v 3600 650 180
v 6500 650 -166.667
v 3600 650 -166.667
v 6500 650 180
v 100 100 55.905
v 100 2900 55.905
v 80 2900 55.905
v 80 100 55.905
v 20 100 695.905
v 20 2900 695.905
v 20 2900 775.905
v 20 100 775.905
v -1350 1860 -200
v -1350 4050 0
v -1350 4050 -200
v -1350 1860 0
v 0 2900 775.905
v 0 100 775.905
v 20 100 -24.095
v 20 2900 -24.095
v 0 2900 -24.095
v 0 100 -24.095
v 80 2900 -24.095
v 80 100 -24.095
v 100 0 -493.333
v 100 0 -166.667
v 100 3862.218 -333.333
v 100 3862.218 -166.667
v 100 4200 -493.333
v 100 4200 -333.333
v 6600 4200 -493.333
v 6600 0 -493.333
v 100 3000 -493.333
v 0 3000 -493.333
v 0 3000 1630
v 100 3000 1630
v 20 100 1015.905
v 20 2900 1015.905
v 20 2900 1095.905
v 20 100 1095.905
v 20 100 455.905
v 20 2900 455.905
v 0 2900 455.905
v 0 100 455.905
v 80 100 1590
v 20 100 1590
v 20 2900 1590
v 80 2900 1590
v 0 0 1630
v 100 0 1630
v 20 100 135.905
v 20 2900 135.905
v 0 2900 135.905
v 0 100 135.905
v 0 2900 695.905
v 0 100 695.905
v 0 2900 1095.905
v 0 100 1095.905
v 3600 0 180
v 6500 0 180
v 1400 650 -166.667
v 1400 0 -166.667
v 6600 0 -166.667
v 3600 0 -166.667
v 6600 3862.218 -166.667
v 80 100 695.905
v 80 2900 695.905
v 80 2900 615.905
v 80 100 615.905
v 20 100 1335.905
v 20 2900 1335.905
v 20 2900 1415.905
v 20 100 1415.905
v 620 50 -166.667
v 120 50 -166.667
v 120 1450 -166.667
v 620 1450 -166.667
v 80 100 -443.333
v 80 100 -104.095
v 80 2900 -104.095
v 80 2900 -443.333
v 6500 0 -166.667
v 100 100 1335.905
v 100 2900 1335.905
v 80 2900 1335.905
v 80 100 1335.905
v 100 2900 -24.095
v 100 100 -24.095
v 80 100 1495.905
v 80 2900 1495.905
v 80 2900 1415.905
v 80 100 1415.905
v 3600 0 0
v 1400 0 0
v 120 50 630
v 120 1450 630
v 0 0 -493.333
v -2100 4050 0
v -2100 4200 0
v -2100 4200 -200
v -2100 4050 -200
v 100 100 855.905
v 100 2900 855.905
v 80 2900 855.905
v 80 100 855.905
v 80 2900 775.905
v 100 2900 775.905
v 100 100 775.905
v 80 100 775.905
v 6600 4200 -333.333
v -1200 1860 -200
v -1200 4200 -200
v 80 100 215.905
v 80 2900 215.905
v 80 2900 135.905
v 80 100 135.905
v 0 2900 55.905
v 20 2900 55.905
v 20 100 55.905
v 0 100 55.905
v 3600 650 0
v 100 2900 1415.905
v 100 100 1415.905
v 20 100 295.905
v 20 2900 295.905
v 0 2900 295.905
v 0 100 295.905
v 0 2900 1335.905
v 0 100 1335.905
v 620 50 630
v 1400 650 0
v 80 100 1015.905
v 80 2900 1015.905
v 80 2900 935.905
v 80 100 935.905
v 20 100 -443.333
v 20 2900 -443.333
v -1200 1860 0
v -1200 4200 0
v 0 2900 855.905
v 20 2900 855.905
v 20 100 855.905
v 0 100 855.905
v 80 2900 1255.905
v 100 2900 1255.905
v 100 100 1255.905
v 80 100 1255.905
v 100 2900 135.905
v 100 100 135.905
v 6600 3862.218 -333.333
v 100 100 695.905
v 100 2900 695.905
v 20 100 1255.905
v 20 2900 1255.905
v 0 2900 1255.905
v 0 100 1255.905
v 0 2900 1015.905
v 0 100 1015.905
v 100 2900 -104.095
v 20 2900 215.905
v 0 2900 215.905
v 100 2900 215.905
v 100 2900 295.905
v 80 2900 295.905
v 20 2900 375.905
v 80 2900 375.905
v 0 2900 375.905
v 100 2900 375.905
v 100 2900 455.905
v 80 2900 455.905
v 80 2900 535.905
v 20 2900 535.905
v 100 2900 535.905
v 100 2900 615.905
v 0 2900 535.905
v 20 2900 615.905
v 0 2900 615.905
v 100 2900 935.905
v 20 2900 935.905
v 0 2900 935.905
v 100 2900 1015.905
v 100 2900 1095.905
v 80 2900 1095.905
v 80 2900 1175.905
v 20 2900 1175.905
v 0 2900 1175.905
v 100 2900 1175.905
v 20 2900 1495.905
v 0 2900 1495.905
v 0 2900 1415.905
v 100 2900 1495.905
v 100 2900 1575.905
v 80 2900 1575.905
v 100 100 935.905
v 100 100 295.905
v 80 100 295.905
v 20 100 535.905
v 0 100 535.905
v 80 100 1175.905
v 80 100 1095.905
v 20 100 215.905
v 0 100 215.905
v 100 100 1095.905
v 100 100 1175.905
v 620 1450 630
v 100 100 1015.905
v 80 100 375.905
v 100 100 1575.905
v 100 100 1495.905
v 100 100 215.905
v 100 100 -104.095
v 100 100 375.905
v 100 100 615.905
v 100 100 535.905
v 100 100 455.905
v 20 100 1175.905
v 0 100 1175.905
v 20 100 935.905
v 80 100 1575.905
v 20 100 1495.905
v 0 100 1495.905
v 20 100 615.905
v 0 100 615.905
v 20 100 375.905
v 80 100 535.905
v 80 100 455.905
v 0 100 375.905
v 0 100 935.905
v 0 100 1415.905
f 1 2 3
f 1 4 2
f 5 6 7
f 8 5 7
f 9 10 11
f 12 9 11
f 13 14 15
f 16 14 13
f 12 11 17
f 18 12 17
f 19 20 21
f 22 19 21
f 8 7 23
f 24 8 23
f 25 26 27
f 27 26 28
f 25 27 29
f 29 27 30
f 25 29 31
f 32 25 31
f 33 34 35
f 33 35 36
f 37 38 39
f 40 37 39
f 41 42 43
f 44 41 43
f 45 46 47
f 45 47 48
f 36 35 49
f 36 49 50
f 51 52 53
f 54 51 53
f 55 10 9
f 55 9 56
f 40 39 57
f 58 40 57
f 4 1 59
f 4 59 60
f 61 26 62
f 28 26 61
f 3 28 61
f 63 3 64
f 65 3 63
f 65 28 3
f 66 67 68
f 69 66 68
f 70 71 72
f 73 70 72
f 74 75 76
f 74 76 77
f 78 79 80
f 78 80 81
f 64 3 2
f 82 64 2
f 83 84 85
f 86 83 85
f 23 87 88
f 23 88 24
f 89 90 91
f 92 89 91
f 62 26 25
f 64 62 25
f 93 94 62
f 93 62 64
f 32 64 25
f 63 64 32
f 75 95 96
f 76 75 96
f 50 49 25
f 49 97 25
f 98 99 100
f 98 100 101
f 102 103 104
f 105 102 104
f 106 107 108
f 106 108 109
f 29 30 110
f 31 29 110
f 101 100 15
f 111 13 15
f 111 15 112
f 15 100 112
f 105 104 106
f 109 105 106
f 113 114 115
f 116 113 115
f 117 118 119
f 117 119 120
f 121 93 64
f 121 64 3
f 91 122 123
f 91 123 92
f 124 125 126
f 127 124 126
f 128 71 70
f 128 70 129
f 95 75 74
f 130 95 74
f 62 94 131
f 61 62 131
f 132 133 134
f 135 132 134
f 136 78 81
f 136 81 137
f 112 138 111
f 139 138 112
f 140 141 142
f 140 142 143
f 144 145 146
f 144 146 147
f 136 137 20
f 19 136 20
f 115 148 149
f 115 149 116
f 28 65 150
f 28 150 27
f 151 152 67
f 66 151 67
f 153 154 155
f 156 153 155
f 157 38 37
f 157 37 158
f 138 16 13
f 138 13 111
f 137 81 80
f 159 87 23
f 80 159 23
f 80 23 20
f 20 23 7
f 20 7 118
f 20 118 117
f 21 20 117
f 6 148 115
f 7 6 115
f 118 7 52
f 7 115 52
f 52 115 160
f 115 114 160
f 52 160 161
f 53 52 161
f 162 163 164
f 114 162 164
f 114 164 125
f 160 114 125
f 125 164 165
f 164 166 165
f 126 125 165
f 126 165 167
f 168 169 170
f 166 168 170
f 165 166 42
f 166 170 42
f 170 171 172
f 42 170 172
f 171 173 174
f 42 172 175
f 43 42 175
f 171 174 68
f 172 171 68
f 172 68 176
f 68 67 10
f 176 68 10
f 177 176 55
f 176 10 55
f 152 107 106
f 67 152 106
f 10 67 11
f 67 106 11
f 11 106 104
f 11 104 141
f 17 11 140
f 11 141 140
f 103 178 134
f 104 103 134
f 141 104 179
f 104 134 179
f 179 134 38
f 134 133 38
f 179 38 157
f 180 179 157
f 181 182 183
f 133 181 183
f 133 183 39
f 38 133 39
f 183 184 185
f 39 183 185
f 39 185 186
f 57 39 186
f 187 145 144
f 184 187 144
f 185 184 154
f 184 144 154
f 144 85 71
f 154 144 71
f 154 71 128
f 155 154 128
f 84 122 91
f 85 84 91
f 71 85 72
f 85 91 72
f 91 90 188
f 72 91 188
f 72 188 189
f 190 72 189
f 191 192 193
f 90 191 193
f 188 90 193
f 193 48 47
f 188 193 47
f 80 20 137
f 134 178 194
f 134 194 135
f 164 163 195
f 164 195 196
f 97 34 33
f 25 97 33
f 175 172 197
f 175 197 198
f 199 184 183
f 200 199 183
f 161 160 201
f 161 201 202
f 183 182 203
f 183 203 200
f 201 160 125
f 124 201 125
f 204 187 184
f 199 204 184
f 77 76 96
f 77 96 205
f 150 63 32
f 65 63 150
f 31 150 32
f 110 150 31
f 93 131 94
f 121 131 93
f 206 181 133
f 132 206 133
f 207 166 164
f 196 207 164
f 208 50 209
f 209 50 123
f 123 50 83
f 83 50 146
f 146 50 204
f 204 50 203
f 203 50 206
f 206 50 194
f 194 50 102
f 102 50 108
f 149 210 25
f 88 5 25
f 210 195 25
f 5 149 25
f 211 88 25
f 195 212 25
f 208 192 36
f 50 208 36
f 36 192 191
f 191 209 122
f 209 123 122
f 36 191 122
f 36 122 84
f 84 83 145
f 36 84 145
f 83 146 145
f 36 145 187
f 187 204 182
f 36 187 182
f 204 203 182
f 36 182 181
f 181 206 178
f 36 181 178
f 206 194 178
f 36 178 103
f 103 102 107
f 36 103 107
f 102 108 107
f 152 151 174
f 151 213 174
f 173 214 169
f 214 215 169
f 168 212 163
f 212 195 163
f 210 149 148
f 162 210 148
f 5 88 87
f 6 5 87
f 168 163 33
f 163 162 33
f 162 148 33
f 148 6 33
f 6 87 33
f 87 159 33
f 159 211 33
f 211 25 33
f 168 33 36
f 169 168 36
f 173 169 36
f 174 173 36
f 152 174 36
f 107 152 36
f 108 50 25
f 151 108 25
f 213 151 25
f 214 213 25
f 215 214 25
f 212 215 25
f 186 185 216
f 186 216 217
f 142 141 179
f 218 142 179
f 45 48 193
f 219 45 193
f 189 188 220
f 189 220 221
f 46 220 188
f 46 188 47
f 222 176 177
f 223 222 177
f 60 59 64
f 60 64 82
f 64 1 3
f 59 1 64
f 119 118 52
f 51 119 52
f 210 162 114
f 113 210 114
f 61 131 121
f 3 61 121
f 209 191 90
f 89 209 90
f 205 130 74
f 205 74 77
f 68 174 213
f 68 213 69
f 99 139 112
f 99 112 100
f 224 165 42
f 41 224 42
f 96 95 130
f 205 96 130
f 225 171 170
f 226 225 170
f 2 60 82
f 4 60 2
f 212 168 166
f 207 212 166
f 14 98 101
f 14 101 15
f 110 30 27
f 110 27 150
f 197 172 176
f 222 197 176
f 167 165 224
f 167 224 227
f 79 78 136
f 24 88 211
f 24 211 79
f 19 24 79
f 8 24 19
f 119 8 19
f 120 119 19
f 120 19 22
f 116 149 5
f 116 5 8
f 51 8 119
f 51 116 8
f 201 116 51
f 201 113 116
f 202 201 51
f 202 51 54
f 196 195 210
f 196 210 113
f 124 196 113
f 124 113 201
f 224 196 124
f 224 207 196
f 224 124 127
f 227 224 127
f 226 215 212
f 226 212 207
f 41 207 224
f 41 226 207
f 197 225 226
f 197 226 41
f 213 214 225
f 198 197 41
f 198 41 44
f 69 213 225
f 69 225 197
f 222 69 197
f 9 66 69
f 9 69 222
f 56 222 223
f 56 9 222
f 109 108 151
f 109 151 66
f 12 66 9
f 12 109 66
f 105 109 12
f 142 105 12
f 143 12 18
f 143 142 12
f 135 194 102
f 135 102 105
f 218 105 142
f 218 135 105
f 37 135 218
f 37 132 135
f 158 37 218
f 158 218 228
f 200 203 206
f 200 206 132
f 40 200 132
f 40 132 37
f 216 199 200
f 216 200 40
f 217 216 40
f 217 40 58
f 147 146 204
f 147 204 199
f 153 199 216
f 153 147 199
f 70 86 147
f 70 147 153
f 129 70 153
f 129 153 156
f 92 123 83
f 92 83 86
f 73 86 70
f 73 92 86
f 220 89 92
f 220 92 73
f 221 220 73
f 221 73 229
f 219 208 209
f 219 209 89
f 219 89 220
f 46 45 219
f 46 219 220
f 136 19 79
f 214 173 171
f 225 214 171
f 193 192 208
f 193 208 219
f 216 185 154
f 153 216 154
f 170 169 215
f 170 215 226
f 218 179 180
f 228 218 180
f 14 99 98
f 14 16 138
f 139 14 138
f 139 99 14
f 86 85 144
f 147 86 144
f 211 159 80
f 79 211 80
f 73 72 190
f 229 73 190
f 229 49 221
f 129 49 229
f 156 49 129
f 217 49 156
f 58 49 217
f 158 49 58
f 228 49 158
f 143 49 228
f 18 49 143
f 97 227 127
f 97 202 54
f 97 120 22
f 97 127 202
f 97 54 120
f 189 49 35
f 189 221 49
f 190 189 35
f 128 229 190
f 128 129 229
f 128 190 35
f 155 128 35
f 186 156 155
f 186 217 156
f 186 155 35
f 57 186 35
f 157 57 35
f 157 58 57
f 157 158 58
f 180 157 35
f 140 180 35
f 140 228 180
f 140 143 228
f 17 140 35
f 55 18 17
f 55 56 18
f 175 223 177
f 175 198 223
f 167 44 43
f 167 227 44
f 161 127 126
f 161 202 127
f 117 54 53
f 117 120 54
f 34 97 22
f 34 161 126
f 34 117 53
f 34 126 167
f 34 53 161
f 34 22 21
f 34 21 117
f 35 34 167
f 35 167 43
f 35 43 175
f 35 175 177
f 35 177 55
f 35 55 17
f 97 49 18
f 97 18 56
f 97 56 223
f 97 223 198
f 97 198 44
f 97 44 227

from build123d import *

# Parameters (mm, degrees)
F2_DEPTH       = 200
F8_W           = 2200
F8_H           = 650
F9_DEPTH       = 493.3333333333
F12_DEPTH      = 326.6666666667
F13_W          = 6500
F13_H          = 337.7816200256
F14_DEPTH      = 160
F16_DEPTH      = 180
F16_DEPTH_BACK = 166.6666666667
F17_W          = 100
F17_H          = 3000
F18_DEPTH      = 493.3333333333
F18_DEPTH_BACK = 1630
F15_W          = 500
F15_H          = 1400
F19_DEPTH      = 630
F19_DEPTH_BACK = 166.6666666667
F22_START      = -100
F21_W          = 20
F21_H          = 80
F22_DEPTH      = 2800


with BuildPart() as f2:
    # F1 (on Top) → F2 (new body)
    with BuildSketch(Plane.XY):
        Polygon((-1200, 4200), (-2100, 4200), (-2100, 4050), (-1350, 4050), (-1350, 1860), (-1200, 1860), align=None)
    extrude(amount=-F2_DEPTH)


with BuildPart() as f9:
    # F8 (on Top) → F9 (new body, through all)
    with BuildSketch(Plane.XY):
        with Locations((2500, 325)):
            Rectangle(F8_W, F8_H)
    extrude(amount=-F9_DEPTH)

    # F11 (on offset) → F12 (join, through all)
    with BuildSketch(Plane.XY.offset(-166.6666666667)):
        Polygon((6600, 3862.2183799744), (100, 3862.2183799744), (100, 0), (1400, 0), (1400, 650), (3600, 650), (3600, 0), (6600, 0), align=None)
    extrude(amount=-F12_DEPTH)

    # F13 (on offset) → F14 (join)
    with BuildSketch(Plane.XY.offset(-333.3333333333)):
        with Locations((3350, 4031.1091899872)):
            Rectangle(F13_W, F13_H)
    extrude(amount=-F14_DEPTH)


with BuildPart() as f16:
    # F15 (on Top) → F16 (new body, two sides)
    with BuildSketch(Plane.XY) as f16_sk:
        Polygon((3600, 650), (3600, 0), (6500, 0), (6500, 650), (5870, 650), align=None)
    extrude(amount=F16_DEPTH)
    extrude(f16_sk.sketch, amount=-F16_DEPTH_BACK)


with BuildPart() as f18:
    # F17 (on Top) → F18 (new body, two sides)
    with BuildSketch(Plane.XY) as f18_sk:
        with Locations((50, 1500)):
            Rectangle(F17_W, F17_H)
    extrude(amount=-F18_DEPTH)
    extrude(f18_sk.sketch, amount=F18_DEPTH_BACK)

    # F21 (on face) → F22 (cut)
    with BuildSketch(Plane(origin=(0, 3000, 0), x_dir=(-1, 0, 0), z_dir=(0, 1, 0)).offset(F22_START)):
        Polygon((-20, 1590), (-80, 1590), (-80, 1575.9045648575), (-80, 1495.9045648575), (-80, 1415.9045648575), (-80, 1335.9045648575), (-80, 1255.9045648575), (-80, 1175.9045648575), (-80, 1095.9045648575), (-80, 1015.9045648575), (-80, 935.9045648575), (-80, 855.9045648575), (-80, 775.9045648575), (-80, 695.9045648575), (-80, 615.9045648575), (-80, 535.9045648575), (-80, 455.9045648575), (-80, 375.9045648575), (-80, 295.9045648575), (-80, 215.9045648575), (-80, 135.9045648575), (-80, 55.9045648575), (-80, -24.0954351425), (-80, -104.0954351425), (-80, -443.3333333333), (-20, -443.3333333333), (-20, -24.0954351425), (-20, 55.9045648575), (-20, 135.9045648575), (-20, 215.9045648575), (-20, 295.9045648575), (-20, 375.9045648575), (-20, 455.9045648575), (-20, 535.9045648575), (-20, 615.9045648575), (-20, 695.9045648575), (-20, 775.9045648575), (-20, 855.9045648575), (-20, 935.9045648575), (-20, 1015.9045648575), (-20, 1095.9045648575), (-20, 1175.9045648575), (-20, 1255.9045648575), (-20, 1335.9045648575), (-20, 1415.9045648575), (-20, 1495.9045648575), align=None)
        with Locations((-90, 1535.9045648575)):
            Rectangle(F21_W, F21_H)
        with Locations((-10, 1455.9045648575)):
            Rectangle(F21_W, F21_H)
        with Locations((-90, 1375.9045648575)):
            Rectangle(F21_W, F21_H)
        with Locations((-10, 1295.9045648575)):
            Rectangle(F21_W, F21_H)
        with Locations((-90, 1215.9045648575)):
            Rectangle(F21_W, F21_H)
        with Locations((-10, 1135.9045648575)):
            Rectangle(F21_W, F21_H)
        with Locations((-90, 1055.9045648575)):
            Rectangle(F21_W, F21_H)
        with Locations((-10, 975.9045648575)):
            Rectangle(F21_W, F21_H)
        with Locations((-90, 895.9045648575)):
            Rectangle(F21_W, F21_H)
        with Locations((-10, 815.9045648575)):
            Rectangle(F21_W, F21_H)
        with Locations((-90, 735.9045648575)):
            Rectangle(F21_W, F21_H)
        with Locations((-10, 655.9045648575)):
            Rectangle(F21_W, F21_H)
        with Locations((-90, 575.9045648575)):
            Rectangle(F21_W, F21_H)
        with Locations((-10, 495.9045648575)):
            Rectangle(F21_W, F21_H)
        with Locations((-90, 415.9045648575)):
            Rectangle(F21_W, F21_H)
        with Locations((-10, 335.9045648575)):
            Rectangle(F21_W, F21_H)
        with Locations((-90, 255.9045648575)):
            Rectangle(F21_W, F21_H)
        with Locations((-10, 175.9045648575)):
            Rectangle(F21_W, F21_H)
        with Locations((-90, 95.9045648575)):
            Rectangle(F21_W, F21_H)
        with Locations((-10, 15.9045648575)):
            Rectangle(F21_W, F21_H)
        with Locations((-90, -64.0954351425)):
            Rectangle(F21_W, F21_H)
    extrude(amount=-F22_DEPTH, mode=Mode.SUBTRACT)


with BuildPart() as f19:
    # F15 (on Top) → F19 (new body, two sides)
    with BuildSketch(Plane.XY) as f19_sk:
        with Locations((370, 750)):
            Rectangle(F15_W, F15_H)
    extrude(amount=F19_DEPTH)
    extrude(f19_sk.sketch, amount=-F19_DEPTH_BACK)


solid = Compound([f2.part, f9.part, f16.part, f18.part, f19.part])
